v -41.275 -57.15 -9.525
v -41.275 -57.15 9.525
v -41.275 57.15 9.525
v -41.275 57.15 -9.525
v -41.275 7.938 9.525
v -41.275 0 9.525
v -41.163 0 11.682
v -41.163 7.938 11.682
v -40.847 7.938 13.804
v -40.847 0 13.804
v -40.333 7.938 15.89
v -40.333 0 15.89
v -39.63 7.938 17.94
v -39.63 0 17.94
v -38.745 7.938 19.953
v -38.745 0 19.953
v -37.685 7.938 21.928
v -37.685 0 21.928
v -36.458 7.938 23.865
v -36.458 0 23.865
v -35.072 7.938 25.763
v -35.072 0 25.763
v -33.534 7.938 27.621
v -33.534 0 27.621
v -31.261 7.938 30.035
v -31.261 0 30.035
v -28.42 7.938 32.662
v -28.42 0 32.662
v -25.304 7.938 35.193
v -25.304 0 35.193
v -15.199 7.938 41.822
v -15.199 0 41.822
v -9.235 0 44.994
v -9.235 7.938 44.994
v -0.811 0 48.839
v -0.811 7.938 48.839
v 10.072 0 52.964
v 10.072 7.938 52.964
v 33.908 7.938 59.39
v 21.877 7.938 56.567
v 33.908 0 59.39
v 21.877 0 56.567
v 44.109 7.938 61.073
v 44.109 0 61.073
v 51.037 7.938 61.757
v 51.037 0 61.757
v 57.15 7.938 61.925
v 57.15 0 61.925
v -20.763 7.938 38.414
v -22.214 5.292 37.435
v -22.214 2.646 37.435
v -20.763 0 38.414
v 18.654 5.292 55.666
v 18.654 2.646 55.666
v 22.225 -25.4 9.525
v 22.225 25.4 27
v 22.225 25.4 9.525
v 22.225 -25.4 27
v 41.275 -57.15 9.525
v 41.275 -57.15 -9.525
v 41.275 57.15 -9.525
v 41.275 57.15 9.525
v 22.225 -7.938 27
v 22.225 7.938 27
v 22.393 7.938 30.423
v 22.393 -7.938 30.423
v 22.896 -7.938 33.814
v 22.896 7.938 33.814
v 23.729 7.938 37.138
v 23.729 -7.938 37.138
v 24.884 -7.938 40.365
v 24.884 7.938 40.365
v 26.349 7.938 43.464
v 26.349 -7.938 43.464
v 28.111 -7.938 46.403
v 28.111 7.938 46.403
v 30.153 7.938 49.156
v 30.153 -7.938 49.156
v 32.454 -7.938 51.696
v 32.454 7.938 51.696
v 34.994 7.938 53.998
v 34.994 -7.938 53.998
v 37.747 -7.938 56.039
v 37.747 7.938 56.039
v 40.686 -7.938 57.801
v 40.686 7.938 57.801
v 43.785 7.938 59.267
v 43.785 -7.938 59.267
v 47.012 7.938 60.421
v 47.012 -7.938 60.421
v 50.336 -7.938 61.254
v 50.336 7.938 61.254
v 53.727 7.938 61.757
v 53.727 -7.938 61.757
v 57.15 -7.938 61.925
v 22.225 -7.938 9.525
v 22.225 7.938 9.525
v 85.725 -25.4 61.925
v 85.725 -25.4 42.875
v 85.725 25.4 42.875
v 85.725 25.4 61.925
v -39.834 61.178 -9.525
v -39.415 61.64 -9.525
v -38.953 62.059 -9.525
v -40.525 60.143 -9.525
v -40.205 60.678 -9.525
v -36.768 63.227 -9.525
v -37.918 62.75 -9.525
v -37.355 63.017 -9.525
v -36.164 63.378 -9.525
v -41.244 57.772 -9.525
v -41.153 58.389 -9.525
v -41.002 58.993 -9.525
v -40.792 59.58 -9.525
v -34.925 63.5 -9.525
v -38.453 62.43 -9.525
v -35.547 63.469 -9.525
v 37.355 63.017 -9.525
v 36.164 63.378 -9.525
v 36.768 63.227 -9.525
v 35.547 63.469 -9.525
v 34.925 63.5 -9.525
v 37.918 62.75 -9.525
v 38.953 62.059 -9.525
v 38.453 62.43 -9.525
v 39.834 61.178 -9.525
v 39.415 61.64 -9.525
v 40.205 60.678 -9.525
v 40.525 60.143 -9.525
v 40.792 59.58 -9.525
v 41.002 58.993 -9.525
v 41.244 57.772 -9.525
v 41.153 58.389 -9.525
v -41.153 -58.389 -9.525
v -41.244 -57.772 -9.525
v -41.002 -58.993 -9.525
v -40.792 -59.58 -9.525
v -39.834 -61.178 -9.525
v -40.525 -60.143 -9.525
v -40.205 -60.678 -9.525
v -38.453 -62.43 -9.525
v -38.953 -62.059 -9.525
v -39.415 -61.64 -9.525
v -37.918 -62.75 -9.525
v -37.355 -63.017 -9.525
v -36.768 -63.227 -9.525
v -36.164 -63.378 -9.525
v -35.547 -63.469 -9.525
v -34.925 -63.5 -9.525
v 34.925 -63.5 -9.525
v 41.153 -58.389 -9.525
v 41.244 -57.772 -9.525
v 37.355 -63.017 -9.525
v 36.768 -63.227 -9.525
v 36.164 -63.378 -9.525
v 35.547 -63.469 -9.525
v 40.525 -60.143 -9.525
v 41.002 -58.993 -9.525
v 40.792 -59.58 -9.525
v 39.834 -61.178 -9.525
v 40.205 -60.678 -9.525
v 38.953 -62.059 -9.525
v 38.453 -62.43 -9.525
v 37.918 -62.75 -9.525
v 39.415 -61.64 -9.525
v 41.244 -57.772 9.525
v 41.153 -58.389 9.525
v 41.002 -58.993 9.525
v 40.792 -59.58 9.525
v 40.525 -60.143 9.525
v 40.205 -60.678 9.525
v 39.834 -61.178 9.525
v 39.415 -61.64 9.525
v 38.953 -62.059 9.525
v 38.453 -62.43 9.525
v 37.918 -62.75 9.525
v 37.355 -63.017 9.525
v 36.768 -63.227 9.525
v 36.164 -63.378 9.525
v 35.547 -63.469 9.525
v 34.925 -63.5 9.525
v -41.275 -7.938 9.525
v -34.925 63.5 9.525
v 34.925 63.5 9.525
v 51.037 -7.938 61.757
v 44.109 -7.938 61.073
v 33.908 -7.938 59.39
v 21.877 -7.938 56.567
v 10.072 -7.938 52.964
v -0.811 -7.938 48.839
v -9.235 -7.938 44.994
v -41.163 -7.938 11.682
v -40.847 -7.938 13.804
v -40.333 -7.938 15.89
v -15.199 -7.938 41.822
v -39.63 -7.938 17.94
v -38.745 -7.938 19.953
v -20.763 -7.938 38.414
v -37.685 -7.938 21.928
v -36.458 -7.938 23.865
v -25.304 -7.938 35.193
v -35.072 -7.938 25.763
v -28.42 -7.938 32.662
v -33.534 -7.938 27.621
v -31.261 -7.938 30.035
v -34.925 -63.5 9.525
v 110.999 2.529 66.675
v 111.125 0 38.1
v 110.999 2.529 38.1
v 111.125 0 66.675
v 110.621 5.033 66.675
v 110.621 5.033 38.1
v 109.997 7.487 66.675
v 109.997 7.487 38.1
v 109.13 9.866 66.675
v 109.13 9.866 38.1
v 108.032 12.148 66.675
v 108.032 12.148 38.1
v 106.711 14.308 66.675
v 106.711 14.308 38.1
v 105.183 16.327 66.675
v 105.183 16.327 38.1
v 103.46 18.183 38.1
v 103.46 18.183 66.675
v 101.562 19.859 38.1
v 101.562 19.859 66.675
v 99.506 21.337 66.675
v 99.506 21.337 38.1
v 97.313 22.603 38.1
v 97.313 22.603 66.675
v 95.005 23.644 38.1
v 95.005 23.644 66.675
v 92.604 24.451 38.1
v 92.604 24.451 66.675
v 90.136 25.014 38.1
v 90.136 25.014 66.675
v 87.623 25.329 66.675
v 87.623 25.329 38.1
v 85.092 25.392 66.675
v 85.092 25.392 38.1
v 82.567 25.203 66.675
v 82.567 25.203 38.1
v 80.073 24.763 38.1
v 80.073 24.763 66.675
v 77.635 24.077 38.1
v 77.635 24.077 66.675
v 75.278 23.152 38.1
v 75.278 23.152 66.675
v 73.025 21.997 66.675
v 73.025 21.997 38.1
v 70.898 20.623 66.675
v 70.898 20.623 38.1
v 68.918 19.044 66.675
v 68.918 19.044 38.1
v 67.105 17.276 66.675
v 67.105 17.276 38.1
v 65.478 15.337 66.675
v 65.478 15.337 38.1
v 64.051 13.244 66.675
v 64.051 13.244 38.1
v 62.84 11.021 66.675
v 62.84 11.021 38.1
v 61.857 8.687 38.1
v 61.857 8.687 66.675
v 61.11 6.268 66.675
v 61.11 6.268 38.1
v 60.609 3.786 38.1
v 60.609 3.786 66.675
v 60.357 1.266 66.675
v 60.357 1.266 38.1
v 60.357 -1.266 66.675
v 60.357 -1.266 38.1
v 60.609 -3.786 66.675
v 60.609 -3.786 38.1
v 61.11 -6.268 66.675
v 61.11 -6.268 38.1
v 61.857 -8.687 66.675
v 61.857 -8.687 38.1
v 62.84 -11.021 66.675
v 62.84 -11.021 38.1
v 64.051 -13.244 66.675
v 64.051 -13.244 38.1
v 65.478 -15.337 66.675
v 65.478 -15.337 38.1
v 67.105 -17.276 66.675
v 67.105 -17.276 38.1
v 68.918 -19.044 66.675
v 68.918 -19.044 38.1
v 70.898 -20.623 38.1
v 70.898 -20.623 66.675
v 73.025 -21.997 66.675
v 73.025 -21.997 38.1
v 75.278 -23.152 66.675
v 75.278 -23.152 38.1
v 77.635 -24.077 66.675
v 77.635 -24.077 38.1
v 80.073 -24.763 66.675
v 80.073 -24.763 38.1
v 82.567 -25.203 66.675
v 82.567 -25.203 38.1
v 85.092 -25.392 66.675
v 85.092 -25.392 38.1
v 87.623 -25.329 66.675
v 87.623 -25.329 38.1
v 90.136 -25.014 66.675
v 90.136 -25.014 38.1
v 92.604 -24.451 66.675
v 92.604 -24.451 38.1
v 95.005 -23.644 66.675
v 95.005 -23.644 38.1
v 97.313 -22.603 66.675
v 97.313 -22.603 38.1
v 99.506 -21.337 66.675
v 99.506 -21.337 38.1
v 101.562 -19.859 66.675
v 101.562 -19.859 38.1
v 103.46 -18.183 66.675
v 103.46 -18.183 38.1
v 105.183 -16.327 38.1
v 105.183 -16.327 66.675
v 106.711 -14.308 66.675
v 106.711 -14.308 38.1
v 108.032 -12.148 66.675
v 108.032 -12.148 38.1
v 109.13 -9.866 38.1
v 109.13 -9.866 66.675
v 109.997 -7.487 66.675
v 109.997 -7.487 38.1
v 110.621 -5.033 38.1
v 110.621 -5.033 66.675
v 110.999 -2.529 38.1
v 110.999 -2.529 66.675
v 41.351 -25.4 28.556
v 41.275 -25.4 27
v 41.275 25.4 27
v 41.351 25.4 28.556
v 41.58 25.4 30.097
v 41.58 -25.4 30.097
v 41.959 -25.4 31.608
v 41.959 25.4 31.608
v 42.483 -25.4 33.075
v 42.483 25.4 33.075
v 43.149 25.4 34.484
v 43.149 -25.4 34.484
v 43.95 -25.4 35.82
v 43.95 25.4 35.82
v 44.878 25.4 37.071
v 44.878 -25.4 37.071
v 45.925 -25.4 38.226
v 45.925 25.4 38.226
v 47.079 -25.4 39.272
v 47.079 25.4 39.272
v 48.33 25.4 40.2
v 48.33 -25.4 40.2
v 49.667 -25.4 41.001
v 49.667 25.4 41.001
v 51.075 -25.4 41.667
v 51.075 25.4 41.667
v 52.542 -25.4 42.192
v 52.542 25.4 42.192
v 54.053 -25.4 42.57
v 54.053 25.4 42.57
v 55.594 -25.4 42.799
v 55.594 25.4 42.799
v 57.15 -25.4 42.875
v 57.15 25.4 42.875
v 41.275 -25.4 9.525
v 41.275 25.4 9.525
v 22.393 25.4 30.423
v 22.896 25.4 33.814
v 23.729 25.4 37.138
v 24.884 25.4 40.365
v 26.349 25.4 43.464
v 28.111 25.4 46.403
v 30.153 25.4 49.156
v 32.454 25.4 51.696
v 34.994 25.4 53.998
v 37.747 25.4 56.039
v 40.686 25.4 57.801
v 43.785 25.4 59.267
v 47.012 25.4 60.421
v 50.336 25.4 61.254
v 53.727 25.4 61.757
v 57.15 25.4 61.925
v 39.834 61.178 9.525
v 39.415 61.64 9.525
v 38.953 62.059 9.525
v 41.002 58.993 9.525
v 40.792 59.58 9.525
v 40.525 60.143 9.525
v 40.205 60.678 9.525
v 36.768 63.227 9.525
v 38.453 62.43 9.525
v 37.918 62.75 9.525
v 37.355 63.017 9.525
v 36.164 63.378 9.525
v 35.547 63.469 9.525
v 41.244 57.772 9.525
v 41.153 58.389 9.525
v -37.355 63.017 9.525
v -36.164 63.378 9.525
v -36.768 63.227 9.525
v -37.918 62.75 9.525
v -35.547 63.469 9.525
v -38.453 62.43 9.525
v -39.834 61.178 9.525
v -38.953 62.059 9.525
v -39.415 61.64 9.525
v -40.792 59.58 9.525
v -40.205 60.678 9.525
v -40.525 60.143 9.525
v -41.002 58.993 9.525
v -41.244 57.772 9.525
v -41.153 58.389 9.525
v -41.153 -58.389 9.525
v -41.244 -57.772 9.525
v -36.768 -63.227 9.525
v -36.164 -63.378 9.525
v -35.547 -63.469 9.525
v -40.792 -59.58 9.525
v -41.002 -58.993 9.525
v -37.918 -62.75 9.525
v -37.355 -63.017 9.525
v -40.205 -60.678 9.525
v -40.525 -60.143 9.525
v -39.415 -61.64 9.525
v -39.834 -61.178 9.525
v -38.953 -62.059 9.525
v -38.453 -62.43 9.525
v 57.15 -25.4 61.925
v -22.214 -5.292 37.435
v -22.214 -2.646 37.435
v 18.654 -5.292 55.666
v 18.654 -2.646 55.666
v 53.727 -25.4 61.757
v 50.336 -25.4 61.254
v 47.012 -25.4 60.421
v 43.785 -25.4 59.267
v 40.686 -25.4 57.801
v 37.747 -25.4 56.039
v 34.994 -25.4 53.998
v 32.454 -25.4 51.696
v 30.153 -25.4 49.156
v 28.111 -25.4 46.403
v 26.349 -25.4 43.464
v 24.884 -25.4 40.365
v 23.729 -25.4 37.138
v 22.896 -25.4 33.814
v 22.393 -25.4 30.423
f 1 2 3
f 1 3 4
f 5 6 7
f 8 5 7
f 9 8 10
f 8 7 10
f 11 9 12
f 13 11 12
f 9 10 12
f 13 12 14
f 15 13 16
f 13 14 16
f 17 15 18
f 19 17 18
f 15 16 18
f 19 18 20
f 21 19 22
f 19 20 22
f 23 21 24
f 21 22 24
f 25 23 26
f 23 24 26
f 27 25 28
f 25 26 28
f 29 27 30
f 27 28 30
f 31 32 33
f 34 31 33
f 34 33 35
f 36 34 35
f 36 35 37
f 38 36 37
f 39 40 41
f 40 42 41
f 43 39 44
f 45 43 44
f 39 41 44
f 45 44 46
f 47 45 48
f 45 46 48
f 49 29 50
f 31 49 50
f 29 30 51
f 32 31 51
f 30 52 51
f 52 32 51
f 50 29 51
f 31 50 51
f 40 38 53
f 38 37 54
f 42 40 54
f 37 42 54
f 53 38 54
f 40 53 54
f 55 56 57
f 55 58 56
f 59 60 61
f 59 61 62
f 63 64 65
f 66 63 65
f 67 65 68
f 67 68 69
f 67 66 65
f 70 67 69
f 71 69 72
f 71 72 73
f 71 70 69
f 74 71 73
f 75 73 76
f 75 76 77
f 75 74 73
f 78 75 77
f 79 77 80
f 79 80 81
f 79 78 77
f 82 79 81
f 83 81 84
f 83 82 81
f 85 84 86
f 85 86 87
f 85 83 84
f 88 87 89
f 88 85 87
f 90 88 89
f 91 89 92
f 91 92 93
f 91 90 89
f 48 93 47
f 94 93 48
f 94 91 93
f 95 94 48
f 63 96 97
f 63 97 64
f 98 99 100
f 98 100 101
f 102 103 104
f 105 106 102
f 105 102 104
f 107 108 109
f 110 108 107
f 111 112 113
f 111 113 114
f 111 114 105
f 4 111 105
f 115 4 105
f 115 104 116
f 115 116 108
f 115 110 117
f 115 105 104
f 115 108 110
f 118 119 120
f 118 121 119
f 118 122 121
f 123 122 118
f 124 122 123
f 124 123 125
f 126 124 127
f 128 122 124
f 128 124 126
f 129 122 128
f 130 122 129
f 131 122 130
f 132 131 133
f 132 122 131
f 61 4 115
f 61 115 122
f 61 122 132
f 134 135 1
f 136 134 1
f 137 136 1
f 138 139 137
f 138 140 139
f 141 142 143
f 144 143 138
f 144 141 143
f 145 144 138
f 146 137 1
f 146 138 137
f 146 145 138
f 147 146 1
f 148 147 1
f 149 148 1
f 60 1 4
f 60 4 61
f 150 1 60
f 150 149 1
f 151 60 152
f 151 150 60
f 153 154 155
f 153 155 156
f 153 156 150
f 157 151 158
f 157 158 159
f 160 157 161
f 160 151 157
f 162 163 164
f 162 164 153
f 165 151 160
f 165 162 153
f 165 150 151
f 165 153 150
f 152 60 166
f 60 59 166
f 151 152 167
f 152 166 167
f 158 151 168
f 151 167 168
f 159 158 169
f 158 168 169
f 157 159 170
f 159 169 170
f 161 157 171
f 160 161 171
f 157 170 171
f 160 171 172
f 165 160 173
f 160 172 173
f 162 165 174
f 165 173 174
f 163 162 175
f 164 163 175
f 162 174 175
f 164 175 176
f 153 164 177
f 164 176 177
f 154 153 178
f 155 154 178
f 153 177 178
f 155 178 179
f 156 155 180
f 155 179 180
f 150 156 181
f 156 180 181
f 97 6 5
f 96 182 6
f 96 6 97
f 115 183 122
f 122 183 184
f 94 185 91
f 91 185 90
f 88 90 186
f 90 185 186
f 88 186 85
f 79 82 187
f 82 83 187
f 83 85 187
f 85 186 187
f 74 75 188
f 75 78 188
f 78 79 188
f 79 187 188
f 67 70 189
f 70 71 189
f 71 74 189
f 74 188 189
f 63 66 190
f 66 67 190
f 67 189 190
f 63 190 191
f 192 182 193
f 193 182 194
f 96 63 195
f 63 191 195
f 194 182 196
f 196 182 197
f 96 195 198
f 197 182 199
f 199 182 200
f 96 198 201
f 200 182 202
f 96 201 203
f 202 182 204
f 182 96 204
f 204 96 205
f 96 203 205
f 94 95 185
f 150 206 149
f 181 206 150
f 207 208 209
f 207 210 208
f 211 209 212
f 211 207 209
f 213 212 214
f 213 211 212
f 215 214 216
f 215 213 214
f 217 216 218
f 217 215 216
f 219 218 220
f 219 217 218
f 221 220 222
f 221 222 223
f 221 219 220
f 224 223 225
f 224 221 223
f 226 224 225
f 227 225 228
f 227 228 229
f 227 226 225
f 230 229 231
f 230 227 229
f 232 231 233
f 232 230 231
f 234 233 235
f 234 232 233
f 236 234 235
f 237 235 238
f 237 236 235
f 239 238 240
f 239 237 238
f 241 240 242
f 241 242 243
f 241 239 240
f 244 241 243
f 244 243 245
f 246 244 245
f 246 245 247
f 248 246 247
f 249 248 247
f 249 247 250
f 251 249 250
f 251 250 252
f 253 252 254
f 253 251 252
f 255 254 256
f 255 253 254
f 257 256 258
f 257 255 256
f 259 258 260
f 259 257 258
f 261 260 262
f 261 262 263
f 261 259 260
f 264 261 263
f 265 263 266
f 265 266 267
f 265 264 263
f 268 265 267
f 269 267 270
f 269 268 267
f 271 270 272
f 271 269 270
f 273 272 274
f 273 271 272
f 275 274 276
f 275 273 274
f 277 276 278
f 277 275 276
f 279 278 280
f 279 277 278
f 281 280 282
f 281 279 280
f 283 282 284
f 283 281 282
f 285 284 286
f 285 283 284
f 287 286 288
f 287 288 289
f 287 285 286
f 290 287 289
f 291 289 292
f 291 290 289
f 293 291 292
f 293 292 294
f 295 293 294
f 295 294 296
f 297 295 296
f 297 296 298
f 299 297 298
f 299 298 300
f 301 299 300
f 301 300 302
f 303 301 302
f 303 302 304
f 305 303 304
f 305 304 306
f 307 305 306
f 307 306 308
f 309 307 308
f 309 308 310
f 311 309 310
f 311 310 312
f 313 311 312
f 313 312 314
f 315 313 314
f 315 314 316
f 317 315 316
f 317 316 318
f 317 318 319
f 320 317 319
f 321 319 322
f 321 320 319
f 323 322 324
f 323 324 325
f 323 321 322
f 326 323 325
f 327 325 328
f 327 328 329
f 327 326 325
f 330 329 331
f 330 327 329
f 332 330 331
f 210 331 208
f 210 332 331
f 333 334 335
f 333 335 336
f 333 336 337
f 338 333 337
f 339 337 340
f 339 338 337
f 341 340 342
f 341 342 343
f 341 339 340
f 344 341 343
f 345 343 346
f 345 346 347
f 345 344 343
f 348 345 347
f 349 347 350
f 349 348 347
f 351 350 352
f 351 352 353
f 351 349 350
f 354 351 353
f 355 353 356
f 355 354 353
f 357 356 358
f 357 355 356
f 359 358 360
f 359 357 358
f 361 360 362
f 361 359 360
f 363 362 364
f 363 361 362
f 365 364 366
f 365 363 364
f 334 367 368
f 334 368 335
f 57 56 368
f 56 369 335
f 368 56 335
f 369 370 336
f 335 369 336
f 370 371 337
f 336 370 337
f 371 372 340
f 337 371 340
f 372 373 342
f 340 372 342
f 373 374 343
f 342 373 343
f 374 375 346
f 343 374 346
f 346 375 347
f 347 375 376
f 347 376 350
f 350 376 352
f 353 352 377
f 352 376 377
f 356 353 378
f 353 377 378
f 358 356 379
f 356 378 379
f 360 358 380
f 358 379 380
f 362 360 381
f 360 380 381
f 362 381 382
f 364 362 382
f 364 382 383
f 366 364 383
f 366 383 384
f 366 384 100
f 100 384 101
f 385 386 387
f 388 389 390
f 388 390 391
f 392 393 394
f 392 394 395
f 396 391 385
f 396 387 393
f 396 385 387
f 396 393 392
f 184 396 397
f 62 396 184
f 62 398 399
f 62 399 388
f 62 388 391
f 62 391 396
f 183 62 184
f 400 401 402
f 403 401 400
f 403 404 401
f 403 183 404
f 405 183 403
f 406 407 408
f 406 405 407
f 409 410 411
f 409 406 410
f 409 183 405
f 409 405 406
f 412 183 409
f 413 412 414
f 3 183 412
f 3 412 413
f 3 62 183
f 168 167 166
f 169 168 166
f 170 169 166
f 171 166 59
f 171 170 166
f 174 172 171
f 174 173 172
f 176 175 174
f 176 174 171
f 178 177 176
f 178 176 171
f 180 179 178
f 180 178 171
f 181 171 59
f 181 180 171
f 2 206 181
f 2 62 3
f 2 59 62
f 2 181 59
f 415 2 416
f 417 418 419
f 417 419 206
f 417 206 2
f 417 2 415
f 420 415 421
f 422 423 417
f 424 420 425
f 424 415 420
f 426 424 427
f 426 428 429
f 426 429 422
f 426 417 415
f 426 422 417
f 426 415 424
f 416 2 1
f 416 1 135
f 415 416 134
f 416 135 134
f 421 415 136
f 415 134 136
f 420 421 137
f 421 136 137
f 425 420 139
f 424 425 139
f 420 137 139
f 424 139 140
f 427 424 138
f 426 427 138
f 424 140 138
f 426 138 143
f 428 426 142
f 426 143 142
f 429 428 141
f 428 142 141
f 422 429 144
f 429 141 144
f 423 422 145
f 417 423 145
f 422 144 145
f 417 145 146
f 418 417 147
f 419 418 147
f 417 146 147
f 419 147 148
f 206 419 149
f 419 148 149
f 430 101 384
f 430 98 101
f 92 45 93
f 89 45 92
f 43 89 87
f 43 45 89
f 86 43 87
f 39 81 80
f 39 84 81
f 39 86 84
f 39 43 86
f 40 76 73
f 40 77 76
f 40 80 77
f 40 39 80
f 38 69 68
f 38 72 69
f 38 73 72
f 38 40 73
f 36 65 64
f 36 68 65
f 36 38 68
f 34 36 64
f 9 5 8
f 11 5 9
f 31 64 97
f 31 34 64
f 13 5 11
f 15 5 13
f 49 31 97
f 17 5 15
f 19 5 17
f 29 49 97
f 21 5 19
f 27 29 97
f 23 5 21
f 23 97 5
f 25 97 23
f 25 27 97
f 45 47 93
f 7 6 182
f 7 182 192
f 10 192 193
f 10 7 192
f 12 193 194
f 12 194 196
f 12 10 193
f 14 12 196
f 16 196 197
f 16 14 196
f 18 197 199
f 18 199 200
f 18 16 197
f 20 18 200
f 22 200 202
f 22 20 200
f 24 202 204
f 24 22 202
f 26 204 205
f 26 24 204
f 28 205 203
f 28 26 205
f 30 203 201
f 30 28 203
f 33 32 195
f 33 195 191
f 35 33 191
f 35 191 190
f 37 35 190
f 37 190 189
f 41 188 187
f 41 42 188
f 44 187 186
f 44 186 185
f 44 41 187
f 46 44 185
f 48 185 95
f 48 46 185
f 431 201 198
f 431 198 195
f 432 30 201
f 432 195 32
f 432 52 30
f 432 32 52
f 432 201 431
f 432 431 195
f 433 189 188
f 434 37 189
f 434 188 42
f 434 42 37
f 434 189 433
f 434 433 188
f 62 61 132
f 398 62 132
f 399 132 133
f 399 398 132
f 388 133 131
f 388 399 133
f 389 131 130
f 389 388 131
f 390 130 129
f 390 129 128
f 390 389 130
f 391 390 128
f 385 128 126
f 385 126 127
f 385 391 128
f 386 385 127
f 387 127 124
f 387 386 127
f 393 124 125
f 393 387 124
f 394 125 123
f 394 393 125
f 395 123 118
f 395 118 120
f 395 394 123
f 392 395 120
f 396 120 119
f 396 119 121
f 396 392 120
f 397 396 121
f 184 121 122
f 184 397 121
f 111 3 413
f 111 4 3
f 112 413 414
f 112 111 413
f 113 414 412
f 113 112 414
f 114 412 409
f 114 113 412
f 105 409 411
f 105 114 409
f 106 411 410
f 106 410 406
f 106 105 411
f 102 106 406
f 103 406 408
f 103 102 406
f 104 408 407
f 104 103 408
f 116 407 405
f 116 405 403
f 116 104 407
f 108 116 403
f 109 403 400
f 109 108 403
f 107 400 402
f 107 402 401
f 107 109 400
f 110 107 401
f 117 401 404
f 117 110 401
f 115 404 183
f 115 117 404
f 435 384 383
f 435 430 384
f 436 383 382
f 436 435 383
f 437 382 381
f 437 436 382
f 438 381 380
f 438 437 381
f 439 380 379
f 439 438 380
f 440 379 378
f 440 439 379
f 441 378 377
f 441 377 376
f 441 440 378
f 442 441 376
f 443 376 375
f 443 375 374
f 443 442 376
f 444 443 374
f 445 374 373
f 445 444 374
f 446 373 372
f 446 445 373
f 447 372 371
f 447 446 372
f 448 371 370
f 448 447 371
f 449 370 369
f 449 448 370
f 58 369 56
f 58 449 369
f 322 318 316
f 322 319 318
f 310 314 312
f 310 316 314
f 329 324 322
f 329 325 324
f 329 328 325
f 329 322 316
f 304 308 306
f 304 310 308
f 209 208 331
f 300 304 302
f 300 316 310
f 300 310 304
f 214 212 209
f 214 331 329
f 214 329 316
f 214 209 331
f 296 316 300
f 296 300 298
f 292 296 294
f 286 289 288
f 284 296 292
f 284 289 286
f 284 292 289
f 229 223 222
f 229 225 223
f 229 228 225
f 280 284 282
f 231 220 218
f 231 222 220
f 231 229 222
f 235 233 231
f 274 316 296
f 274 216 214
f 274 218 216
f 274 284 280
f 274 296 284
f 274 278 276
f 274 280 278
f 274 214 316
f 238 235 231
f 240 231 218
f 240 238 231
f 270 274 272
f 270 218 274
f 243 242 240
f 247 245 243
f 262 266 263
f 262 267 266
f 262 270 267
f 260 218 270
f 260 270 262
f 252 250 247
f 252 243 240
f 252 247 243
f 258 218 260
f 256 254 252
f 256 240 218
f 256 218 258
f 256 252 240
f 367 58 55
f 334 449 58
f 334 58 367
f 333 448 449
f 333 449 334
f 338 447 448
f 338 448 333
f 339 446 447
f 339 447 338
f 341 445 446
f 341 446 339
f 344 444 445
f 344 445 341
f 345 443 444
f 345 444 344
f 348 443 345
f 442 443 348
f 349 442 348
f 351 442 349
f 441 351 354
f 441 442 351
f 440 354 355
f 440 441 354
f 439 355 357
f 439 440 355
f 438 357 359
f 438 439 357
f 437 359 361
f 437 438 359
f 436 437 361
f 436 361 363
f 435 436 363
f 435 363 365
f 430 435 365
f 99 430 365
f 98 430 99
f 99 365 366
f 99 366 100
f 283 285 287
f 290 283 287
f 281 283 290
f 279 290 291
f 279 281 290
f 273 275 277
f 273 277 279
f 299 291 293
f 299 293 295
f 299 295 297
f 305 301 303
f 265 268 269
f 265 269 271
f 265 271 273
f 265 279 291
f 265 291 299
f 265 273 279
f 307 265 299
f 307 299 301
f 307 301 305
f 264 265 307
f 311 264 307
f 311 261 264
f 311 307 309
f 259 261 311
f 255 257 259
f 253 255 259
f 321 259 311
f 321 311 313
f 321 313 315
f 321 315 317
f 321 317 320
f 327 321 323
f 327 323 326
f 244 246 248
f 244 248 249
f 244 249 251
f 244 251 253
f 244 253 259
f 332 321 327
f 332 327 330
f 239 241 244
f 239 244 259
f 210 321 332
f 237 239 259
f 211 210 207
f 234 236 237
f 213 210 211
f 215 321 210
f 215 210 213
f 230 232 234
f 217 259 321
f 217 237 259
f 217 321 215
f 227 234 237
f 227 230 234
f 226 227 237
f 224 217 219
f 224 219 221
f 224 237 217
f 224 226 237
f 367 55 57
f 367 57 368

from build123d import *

# Parameters (mm, degrees)
F1_DEPTH = 63.5
F0_W     = 25.4
F0_H     = 19.05
F2_DEPTH = 25.4
F3_DEPTH = 7.9375
F5_R     = 6.35


with BuildPart() as f1:
    # F0 (on Front) → F1 (new body, symmetric)
    with BuildSketch(Plane.XZ):
        Polygon((22.225, 9.525), (-41.275, 9.525), (-41.275, -9.525), (41.275, -9.525), (41.275, 9.525), align=None)
    extrude(amount=F1_DEPTH, both=True)

    # F5
    f5_edges = [f1.edges().sort_by_distance(p)[0] for p in [
        (41.275, -63.5, 0),
        (-41.275, -63.5, 0),
        (-41.275, 63.5, 0),
        (41.275, 63.5, 0),
    ]]
    fillet(f5_edges, radius=F5_R)


with BuildPart() as f2:
    # F0 (on Front) → F2 (new body, symmetric)
    with BuildSketch(Plane.XZ):
        with BuildLine():
            Line((22.225, 27.0002), (22.225, 9.525))
            Line((22.225, 9.525), (41.275, 9.525))
            Line((41.275, 9.525), (41.275, 27.0002))
            ThreePointArc((41.275, 27.0002), (45.9246798487, 38.2255201513), (57.15, 42.8752))
            Line((57.15, 42.8752), (60.325, 42.8752))
            Line((60.325, 42.8752), (60.325, 61.9252))
            Line((60.325, 61.9252), (57.15, 61.9252))
            ThreePointArc((57.15, 61.9252), (32.4542956671, 51.6959043329), (22.225, 27.0002))
        make_face()
        with Locations((73.025, 52.4002)):
            Rectangle(F0_W, F0_H)
    extrude(amount=F2_DEPTH, both=True)


with BuildPart() as f3:
    # F0 (on Front) → F3 (new body, symmetric)
    with BuildSketch(Plane.XZ):
        with BuildLine():
            add(Edge.make_bspline(
                [(-41.275, 9.525), (-41.1764532328, 41.511323303), (27.8992466629, 62.4158084393), (57.15, 61.9252)],
                knots=[0, 0, 0, 0, 111.5045361635, 111.5045361635, 111.5045361635, 111.5045361635], degree=3))
            Line((-41.275, 9.525), (22.225, 9.525))
            Line((22.225, 9.525), (22.225, 27.0002))
            ThreePointArc((22.225, 27.0002), (32.4542956671, 51.6959043329), (57.15, 61.9252))
        make_face()
    extrude(amount=F3_DEPTH, both=True)


with BuildPart() as f4:
    # F0 (on Front) → F4 (revolve)
    with BuildSketch(Plane.XZ):
        Polygon((85.725, 66.675), (85.725, 61.9252), (85.725, 42.8752), (85.725, 38.1), (111.125, 38.1), (111.125, 66.675), align=None)
    revolve(axis=Axis((85.725, 0, 52.3875), (0, 0, 1)))


solid = Compound([f1.part, f2.part, f3.part, f4.part])
